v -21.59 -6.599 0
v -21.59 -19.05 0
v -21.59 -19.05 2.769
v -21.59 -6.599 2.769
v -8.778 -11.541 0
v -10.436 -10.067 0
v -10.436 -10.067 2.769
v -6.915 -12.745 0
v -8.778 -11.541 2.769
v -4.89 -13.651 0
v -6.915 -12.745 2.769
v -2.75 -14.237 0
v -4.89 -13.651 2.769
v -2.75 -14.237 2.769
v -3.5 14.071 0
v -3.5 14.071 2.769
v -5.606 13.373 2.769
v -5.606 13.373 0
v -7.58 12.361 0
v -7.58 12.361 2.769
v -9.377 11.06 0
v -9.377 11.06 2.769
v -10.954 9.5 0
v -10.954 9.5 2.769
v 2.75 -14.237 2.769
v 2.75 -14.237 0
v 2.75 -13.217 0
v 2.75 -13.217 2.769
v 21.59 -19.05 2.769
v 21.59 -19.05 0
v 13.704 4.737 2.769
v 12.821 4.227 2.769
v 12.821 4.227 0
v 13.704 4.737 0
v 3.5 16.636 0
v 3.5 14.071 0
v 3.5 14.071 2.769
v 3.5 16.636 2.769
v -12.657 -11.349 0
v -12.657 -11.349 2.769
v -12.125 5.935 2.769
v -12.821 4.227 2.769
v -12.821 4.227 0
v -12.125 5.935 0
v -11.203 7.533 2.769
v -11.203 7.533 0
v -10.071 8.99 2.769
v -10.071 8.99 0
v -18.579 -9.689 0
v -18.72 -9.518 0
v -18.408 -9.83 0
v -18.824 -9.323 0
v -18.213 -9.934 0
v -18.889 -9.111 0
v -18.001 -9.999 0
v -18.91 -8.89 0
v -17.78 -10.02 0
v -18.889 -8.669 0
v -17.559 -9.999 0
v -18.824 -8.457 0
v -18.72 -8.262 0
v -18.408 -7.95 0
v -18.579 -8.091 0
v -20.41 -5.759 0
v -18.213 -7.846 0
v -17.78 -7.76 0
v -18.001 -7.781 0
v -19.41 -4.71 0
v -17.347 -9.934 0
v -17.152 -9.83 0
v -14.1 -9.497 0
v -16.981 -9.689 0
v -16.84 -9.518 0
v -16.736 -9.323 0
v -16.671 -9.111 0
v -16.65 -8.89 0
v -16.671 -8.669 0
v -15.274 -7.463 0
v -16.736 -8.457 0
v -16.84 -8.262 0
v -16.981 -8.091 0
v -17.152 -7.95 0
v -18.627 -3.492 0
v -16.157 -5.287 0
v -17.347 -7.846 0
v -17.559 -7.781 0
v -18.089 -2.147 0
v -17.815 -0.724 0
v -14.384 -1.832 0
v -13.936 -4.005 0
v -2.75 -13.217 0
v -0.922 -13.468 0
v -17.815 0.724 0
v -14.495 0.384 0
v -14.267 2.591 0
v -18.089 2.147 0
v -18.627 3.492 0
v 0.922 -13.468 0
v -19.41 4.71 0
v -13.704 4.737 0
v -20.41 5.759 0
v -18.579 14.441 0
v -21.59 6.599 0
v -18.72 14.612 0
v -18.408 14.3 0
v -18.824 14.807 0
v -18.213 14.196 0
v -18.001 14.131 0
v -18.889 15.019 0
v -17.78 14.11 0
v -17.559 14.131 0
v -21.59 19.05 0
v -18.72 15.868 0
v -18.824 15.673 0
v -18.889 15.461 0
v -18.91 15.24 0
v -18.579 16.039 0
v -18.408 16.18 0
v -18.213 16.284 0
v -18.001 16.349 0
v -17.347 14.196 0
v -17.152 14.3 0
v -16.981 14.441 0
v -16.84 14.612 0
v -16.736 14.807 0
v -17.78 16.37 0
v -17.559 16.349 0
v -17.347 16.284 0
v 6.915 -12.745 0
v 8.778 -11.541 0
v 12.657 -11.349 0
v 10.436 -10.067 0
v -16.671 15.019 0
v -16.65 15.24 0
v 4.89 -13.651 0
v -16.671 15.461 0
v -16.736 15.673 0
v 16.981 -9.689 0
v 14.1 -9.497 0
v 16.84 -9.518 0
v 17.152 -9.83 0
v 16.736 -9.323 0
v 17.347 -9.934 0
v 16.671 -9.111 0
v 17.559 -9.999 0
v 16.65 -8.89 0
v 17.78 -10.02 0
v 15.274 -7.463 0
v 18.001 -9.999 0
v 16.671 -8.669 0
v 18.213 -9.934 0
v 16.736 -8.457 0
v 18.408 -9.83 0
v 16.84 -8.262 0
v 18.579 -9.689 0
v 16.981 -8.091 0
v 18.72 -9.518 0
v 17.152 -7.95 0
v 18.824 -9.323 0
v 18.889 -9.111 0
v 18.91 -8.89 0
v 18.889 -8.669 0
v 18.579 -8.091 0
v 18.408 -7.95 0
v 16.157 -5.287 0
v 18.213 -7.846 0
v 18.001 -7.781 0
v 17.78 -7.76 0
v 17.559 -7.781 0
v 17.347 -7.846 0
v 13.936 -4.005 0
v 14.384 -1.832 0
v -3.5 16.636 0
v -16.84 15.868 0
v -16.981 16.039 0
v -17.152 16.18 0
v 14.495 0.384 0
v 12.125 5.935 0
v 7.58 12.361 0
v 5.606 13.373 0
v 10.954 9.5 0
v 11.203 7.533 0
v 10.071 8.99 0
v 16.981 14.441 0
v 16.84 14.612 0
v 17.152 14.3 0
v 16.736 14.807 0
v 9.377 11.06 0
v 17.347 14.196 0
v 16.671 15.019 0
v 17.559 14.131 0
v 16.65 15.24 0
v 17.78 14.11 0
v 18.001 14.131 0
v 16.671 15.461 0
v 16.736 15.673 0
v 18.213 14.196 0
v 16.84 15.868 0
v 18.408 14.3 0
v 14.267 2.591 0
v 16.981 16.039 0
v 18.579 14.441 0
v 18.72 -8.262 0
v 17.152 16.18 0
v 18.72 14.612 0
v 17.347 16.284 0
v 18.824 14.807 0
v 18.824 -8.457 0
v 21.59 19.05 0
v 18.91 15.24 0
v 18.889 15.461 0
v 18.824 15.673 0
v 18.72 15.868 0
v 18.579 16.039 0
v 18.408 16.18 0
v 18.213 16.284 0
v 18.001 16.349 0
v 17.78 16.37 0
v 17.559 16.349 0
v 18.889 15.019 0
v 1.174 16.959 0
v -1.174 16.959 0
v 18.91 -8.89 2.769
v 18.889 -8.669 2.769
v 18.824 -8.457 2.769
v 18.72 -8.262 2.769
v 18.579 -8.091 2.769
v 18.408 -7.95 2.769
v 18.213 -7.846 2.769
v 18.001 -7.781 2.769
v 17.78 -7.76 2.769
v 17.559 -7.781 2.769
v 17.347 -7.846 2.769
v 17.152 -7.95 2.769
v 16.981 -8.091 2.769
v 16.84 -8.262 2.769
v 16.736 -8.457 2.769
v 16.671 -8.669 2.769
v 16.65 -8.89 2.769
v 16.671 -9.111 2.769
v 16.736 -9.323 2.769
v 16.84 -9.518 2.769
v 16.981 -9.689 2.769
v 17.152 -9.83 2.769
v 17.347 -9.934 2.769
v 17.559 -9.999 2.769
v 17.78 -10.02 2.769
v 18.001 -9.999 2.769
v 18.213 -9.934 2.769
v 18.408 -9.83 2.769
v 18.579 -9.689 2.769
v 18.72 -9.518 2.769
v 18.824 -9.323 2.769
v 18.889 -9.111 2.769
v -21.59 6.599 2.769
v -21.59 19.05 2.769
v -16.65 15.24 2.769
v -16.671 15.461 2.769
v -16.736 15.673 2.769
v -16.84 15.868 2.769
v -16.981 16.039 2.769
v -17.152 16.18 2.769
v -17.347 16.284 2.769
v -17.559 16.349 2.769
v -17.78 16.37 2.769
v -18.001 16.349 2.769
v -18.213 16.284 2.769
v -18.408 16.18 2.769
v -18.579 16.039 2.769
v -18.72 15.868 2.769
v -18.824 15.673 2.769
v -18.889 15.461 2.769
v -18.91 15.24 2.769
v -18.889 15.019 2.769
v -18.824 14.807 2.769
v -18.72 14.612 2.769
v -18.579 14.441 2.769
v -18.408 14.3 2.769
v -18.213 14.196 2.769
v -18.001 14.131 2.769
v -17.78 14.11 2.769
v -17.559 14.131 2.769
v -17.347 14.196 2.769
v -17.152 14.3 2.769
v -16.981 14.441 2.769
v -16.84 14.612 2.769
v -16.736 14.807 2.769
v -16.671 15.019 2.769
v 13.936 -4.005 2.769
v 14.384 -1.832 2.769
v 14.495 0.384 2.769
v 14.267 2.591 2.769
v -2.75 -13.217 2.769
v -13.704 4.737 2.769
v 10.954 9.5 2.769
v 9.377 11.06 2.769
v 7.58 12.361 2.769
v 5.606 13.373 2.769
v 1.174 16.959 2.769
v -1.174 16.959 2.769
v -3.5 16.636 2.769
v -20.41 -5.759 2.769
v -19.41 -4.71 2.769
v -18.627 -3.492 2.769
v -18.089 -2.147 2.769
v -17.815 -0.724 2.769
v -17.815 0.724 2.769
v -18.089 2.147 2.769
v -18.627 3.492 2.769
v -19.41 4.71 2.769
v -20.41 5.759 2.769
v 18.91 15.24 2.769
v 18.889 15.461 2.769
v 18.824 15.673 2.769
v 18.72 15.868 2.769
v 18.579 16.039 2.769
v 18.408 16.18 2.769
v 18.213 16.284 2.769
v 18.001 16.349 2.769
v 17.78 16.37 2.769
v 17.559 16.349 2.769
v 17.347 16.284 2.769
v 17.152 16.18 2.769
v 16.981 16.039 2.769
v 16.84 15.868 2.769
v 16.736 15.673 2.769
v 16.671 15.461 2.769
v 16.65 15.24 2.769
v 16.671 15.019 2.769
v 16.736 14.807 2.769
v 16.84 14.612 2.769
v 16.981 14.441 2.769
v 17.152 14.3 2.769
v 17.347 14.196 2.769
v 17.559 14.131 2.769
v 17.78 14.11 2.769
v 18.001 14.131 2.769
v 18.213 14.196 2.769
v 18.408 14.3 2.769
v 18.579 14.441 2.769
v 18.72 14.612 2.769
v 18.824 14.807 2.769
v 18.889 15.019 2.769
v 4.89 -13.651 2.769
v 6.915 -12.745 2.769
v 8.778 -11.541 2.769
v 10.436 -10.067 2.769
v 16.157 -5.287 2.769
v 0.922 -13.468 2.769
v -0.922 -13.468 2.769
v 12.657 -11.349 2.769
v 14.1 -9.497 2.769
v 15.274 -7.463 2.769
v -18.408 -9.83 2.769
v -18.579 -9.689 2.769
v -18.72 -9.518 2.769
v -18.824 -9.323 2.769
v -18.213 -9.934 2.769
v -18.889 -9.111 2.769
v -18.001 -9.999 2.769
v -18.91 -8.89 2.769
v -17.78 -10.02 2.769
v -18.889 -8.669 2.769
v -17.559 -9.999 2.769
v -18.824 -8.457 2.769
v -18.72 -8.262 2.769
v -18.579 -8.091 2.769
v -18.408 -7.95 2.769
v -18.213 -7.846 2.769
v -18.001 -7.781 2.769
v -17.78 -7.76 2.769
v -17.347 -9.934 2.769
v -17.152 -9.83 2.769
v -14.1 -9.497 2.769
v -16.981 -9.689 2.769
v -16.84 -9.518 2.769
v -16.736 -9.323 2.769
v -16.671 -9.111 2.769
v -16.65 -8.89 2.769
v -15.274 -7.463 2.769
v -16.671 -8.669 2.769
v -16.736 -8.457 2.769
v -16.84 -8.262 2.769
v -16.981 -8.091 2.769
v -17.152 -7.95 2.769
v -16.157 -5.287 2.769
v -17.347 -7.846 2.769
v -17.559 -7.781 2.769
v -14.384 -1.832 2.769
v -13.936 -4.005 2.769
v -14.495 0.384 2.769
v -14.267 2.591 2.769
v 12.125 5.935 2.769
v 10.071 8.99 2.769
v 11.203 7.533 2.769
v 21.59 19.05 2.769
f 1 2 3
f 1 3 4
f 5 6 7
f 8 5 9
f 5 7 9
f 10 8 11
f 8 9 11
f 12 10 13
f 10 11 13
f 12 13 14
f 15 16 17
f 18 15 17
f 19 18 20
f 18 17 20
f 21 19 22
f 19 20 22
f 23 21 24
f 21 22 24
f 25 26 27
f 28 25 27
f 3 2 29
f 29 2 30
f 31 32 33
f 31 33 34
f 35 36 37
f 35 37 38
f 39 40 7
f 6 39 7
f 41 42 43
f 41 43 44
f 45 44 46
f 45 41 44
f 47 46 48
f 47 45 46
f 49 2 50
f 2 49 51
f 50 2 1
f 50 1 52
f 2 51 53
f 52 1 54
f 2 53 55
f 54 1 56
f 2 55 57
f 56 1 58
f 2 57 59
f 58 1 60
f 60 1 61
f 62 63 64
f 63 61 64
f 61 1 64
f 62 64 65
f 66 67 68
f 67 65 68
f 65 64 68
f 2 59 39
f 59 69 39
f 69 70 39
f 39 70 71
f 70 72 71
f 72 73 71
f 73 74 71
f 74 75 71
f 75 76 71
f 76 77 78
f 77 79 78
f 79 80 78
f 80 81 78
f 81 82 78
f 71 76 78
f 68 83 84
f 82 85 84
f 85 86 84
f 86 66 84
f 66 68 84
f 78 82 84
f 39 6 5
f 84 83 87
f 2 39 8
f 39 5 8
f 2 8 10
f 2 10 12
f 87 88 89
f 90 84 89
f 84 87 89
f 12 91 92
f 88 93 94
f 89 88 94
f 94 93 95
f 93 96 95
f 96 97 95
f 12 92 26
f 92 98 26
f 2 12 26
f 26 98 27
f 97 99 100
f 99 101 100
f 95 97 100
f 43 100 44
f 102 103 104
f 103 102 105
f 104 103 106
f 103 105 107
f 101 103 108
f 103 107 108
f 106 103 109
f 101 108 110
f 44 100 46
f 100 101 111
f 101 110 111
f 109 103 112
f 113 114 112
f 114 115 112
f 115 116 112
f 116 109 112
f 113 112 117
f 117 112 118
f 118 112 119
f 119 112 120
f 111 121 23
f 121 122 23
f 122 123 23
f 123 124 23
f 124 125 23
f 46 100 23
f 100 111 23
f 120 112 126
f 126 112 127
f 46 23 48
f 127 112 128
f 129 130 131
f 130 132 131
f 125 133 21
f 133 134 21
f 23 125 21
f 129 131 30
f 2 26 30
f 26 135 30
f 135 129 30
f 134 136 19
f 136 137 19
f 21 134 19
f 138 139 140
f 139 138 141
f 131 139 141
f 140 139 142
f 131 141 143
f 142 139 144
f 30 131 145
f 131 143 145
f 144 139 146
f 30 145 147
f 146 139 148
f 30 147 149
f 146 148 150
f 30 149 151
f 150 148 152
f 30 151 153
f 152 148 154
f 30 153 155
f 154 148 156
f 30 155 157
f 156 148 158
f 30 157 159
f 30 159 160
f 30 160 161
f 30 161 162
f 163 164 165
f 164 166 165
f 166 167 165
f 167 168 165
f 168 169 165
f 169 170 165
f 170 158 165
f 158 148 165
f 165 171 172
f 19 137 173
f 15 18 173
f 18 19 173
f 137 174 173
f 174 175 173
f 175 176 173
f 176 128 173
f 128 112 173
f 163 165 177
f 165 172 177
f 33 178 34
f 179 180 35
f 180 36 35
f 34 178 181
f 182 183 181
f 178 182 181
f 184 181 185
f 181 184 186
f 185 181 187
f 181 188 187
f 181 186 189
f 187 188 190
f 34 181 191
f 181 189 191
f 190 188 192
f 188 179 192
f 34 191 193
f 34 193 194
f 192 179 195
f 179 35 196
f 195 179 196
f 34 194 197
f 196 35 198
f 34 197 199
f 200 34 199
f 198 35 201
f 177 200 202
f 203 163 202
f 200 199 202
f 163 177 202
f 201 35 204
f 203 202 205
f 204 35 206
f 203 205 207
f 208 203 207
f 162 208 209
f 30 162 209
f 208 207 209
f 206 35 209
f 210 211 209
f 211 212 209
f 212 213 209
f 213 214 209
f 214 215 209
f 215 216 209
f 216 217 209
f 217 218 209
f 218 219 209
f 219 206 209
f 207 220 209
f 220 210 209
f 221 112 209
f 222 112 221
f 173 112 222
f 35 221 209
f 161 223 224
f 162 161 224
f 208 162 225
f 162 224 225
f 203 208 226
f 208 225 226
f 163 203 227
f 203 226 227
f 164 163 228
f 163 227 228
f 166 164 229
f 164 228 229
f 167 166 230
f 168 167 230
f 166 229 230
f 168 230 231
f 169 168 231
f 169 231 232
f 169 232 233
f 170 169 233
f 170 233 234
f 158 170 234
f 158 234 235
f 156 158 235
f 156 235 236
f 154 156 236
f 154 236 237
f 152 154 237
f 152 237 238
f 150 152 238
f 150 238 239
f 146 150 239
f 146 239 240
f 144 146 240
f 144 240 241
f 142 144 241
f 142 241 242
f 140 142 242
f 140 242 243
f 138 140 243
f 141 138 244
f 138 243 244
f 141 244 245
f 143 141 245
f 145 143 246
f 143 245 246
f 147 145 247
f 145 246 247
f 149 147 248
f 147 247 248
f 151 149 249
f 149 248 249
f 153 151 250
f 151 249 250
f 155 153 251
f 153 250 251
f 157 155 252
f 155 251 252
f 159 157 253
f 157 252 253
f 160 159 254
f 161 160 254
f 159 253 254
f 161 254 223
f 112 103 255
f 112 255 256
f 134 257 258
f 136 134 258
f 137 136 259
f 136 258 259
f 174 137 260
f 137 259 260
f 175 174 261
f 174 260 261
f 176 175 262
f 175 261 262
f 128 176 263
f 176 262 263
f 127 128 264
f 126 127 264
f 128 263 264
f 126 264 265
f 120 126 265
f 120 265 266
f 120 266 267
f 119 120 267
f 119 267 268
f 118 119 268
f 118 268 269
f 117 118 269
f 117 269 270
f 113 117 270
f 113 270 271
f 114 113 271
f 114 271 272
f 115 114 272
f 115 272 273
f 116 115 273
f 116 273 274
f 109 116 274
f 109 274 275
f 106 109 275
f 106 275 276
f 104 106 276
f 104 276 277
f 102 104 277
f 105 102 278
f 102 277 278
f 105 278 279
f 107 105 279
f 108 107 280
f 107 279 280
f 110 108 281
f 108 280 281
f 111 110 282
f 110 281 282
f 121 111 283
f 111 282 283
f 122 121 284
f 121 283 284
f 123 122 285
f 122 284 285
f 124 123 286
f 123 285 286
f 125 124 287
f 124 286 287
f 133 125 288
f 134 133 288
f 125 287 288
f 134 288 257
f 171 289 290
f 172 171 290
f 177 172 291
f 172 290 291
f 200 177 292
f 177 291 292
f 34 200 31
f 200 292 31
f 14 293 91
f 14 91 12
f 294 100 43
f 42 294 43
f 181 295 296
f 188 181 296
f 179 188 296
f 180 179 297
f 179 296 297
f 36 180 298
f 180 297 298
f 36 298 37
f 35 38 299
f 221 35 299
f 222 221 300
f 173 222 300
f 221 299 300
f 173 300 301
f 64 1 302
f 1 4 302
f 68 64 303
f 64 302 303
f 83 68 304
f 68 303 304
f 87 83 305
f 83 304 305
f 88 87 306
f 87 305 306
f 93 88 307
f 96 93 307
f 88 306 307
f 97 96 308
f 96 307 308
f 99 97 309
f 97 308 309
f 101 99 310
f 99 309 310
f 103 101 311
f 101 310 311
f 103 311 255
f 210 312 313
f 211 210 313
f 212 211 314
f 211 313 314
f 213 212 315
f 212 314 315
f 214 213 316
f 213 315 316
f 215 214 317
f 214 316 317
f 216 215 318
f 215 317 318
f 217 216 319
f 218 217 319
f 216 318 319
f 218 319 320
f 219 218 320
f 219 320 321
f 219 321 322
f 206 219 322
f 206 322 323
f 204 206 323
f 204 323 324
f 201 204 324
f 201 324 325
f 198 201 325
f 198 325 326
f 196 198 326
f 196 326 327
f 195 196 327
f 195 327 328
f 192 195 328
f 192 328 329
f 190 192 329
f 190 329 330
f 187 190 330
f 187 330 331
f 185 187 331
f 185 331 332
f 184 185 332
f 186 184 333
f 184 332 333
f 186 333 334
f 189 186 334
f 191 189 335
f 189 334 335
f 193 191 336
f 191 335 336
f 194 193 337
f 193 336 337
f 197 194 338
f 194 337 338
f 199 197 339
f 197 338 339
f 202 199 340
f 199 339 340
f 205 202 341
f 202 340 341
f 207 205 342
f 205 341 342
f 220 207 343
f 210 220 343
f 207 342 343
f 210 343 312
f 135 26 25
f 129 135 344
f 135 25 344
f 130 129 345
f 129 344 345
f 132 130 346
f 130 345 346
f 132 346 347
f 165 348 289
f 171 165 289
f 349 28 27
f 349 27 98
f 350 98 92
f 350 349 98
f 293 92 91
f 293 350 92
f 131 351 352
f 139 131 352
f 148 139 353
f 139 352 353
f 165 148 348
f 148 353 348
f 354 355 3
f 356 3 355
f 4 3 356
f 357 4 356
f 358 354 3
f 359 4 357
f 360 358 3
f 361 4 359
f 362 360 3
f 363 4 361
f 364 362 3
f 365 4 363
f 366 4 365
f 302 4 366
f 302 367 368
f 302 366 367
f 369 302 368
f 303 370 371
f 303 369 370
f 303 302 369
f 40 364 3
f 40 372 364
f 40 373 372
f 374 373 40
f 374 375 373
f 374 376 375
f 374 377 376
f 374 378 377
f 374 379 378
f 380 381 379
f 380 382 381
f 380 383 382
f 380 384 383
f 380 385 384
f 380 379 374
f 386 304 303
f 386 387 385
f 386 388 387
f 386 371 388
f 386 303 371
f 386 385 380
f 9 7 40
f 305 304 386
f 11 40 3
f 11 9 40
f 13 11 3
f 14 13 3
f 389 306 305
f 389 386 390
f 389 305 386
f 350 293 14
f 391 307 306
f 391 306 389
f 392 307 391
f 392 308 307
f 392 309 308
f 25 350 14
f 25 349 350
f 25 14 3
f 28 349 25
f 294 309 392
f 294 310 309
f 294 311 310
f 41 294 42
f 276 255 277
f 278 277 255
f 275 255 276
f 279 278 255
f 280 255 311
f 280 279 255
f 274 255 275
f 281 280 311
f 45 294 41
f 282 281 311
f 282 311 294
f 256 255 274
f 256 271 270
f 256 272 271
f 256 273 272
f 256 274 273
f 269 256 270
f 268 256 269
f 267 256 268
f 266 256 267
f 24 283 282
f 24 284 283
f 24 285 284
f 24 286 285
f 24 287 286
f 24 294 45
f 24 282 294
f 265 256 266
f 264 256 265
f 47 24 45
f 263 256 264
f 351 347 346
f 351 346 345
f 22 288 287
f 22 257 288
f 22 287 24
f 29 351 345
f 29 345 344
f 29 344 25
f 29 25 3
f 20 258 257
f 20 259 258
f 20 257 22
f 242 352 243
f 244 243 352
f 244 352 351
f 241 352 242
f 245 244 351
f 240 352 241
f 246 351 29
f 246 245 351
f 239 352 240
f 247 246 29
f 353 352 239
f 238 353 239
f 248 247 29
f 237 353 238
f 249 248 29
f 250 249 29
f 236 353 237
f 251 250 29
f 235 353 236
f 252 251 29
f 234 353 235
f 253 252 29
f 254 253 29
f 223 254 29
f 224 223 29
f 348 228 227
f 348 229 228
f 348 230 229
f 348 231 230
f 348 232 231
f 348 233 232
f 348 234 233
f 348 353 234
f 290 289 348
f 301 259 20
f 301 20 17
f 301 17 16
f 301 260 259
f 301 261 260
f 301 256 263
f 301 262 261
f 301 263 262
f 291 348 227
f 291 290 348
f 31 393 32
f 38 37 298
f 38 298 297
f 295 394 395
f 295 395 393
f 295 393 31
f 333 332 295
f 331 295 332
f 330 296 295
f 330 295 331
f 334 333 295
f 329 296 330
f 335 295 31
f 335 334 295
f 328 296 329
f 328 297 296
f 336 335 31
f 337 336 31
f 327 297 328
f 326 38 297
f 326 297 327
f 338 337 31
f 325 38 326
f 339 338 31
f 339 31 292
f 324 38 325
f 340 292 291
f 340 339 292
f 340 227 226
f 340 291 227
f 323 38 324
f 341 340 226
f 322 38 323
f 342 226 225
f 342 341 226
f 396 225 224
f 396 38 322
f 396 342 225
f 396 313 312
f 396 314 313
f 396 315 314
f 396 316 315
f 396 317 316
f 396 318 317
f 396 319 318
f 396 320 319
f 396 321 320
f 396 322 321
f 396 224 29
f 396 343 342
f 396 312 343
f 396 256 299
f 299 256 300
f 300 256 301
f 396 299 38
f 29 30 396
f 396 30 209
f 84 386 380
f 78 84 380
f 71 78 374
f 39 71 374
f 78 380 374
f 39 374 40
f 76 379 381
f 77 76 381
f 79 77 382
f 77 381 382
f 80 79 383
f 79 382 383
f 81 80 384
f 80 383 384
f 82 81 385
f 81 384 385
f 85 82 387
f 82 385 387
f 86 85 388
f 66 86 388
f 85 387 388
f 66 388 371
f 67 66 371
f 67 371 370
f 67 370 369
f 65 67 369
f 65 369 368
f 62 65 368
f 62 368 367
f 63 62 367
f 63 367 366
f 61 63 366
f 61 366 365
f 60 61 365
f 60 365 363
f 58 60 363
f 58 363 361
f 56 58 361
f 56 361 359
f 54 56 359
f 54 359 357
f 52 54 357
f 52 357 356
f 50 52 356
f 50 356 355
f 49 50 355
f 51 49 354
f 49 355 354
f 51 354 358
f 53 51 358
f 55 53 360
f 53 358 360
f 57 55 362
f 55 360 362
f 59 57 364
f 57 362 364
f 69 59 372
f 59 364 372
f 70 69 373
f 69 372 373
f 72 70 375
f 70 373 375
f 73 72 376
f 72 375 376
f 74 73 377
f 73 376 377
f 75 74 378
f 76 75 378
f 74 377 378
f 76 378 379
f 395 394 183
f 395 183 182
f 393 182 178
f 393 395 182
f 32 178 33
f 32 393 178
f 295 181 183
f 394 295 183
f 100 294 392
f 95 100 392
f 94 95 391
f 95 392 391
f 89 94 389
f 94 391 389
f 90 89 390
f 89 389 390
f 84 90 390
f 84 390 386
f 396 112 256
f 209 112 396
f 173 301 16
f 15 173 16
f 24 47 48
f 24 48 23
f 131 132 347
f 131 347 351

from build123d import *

# Parameters (mm, degrees)
SKETCH1_W             = 43.18
SKETCH1_H             = 38.1
BOSS_EXTRUDE1_DEPTH   = 2.7686
SKETCH2_R             = 14.5
CUT_EXTRUDE1_DEPTH    = 29.925693526
CUT_EXTRUDE2_DEPTH    = 29.925693526
CIRPATTERN1_COUNT     = 3
BOSS_EXTRUDE2_DEPTH   = 2.7686
CIRPATTERN2_COUNT     = 3
SKETCH6_R             = 7.62
CUT_EXTRUDE4_DEPTH    = 29.925693526
F_4_40_TAPPED_HOLE1_D = 2.2606


with BuildPart() as part:
    # Sketch1 → Boss-Extrude1 (new body)
    with BuildSketch(Plane.XY):
        Rectangle(SKETCH1_W, SKETCH1_H)
    extrude(amount=BOSS_EXTRUDE1_DEPTH)

    # Sketch2 → Cut-Extrude1 (cut, through all)
    with BuildSketch(Plane.XY.offset(2.7686)):
        Circle(SKETCH2_R)
    extrude(amount=-CUT_EXTRUDE1_DEPTH, mode=Mode.SUBTRACT)

    # Sketch3 → Cut-Extrude2 (cut, through all)
    with BuildSketch(Plane.XY.offset(2.7686)):
        with BuildLine():
            Line((-3.5, 16.63580476), (-3.5, 14.071247279))
            ThreePointArc((-3.5, 14.071247279), (0, 14.5), (3.5, 14.071247279))
            Line((3.5, 14.071247279), (3.5, 16.63580476))
            ThreePointArc((3.5, 16.63580476), (0, 17), (-3.5, 16.63580476))
        make_face()
    cut_extrude2 = extrude(amount=-CUT_EXTRUDE2_DEPTH, mode=Mode.SUBTRACT)

    # CirPattern1: Cut-Extrude2 ×3 about axis
    cirpattern1_axis = Axis((0, 0, 0), (0, 0, 1))
    for i in range(1, CIRPATTERN1_COUNT):
        add(cut_extrude2.rotate(cirpattern1_axis, i * 360 / CIRPATTERN1_COUNT), mode=Mode.SUBTRACT)

    # Sketch4 → Boss-Extrude2 (add)
    with BuildSketch(Plane.XY.offset(2.7686)):
        with BuildLine():
            Line((-2.75, -13.216939888), (-2.75, -14.236836025))
            ThreePointArc((-2.75, -14.236836025), (0, -14.5), (2.75, -14.236836025))
            Line((2.75, -14.236836025), (2.75, -13.216939888))
            ThreePointArc((2.75, -13.216939888), (0, -13.5), (-2.75, -13.216939888))
        make_face()
    boss_extrude2 = extrude(amount=-BOSS_EXTRUDE2_DEPTH)

    # CirPattern2: Boss-Extrude2 ×3 about axis
    cirpattern2_axis = Axis((0, 0, 0), (0, 0, 1))
    for i in range(1, CIRPATTERN2_COUNT):
        add(boss_extrude2.rotate(cirpattern2_axis, i * 360 / CIRPATTERN2_COUNT))

    # Sketch6 → Cut-Extrude4 (cut, through all)
    with BuildSketch(Plane.XY.offset(2.7686)):
        with Locations((-25.4, 0)):
            Circle(SKETCH6_R)
    extrude(amount=-CUT_EXTRUDE4_DEPTH, mode=Mode.SUBTRACT)

    # #4-40 Tapped Hole1 (through all)
    with Locations(Plane(origin=(0, 0, 0), x_dir=(-1, 0, 0), z_dir=(0, 0, -1))):
        with Locations((-17.78, 15.24), (-17.78, -8.89), (17.78, -8.89), (17.78, 15.24)):
            Hole(F_4_40_TAPPED_HOLE1_D / 2)


solid = part.part
